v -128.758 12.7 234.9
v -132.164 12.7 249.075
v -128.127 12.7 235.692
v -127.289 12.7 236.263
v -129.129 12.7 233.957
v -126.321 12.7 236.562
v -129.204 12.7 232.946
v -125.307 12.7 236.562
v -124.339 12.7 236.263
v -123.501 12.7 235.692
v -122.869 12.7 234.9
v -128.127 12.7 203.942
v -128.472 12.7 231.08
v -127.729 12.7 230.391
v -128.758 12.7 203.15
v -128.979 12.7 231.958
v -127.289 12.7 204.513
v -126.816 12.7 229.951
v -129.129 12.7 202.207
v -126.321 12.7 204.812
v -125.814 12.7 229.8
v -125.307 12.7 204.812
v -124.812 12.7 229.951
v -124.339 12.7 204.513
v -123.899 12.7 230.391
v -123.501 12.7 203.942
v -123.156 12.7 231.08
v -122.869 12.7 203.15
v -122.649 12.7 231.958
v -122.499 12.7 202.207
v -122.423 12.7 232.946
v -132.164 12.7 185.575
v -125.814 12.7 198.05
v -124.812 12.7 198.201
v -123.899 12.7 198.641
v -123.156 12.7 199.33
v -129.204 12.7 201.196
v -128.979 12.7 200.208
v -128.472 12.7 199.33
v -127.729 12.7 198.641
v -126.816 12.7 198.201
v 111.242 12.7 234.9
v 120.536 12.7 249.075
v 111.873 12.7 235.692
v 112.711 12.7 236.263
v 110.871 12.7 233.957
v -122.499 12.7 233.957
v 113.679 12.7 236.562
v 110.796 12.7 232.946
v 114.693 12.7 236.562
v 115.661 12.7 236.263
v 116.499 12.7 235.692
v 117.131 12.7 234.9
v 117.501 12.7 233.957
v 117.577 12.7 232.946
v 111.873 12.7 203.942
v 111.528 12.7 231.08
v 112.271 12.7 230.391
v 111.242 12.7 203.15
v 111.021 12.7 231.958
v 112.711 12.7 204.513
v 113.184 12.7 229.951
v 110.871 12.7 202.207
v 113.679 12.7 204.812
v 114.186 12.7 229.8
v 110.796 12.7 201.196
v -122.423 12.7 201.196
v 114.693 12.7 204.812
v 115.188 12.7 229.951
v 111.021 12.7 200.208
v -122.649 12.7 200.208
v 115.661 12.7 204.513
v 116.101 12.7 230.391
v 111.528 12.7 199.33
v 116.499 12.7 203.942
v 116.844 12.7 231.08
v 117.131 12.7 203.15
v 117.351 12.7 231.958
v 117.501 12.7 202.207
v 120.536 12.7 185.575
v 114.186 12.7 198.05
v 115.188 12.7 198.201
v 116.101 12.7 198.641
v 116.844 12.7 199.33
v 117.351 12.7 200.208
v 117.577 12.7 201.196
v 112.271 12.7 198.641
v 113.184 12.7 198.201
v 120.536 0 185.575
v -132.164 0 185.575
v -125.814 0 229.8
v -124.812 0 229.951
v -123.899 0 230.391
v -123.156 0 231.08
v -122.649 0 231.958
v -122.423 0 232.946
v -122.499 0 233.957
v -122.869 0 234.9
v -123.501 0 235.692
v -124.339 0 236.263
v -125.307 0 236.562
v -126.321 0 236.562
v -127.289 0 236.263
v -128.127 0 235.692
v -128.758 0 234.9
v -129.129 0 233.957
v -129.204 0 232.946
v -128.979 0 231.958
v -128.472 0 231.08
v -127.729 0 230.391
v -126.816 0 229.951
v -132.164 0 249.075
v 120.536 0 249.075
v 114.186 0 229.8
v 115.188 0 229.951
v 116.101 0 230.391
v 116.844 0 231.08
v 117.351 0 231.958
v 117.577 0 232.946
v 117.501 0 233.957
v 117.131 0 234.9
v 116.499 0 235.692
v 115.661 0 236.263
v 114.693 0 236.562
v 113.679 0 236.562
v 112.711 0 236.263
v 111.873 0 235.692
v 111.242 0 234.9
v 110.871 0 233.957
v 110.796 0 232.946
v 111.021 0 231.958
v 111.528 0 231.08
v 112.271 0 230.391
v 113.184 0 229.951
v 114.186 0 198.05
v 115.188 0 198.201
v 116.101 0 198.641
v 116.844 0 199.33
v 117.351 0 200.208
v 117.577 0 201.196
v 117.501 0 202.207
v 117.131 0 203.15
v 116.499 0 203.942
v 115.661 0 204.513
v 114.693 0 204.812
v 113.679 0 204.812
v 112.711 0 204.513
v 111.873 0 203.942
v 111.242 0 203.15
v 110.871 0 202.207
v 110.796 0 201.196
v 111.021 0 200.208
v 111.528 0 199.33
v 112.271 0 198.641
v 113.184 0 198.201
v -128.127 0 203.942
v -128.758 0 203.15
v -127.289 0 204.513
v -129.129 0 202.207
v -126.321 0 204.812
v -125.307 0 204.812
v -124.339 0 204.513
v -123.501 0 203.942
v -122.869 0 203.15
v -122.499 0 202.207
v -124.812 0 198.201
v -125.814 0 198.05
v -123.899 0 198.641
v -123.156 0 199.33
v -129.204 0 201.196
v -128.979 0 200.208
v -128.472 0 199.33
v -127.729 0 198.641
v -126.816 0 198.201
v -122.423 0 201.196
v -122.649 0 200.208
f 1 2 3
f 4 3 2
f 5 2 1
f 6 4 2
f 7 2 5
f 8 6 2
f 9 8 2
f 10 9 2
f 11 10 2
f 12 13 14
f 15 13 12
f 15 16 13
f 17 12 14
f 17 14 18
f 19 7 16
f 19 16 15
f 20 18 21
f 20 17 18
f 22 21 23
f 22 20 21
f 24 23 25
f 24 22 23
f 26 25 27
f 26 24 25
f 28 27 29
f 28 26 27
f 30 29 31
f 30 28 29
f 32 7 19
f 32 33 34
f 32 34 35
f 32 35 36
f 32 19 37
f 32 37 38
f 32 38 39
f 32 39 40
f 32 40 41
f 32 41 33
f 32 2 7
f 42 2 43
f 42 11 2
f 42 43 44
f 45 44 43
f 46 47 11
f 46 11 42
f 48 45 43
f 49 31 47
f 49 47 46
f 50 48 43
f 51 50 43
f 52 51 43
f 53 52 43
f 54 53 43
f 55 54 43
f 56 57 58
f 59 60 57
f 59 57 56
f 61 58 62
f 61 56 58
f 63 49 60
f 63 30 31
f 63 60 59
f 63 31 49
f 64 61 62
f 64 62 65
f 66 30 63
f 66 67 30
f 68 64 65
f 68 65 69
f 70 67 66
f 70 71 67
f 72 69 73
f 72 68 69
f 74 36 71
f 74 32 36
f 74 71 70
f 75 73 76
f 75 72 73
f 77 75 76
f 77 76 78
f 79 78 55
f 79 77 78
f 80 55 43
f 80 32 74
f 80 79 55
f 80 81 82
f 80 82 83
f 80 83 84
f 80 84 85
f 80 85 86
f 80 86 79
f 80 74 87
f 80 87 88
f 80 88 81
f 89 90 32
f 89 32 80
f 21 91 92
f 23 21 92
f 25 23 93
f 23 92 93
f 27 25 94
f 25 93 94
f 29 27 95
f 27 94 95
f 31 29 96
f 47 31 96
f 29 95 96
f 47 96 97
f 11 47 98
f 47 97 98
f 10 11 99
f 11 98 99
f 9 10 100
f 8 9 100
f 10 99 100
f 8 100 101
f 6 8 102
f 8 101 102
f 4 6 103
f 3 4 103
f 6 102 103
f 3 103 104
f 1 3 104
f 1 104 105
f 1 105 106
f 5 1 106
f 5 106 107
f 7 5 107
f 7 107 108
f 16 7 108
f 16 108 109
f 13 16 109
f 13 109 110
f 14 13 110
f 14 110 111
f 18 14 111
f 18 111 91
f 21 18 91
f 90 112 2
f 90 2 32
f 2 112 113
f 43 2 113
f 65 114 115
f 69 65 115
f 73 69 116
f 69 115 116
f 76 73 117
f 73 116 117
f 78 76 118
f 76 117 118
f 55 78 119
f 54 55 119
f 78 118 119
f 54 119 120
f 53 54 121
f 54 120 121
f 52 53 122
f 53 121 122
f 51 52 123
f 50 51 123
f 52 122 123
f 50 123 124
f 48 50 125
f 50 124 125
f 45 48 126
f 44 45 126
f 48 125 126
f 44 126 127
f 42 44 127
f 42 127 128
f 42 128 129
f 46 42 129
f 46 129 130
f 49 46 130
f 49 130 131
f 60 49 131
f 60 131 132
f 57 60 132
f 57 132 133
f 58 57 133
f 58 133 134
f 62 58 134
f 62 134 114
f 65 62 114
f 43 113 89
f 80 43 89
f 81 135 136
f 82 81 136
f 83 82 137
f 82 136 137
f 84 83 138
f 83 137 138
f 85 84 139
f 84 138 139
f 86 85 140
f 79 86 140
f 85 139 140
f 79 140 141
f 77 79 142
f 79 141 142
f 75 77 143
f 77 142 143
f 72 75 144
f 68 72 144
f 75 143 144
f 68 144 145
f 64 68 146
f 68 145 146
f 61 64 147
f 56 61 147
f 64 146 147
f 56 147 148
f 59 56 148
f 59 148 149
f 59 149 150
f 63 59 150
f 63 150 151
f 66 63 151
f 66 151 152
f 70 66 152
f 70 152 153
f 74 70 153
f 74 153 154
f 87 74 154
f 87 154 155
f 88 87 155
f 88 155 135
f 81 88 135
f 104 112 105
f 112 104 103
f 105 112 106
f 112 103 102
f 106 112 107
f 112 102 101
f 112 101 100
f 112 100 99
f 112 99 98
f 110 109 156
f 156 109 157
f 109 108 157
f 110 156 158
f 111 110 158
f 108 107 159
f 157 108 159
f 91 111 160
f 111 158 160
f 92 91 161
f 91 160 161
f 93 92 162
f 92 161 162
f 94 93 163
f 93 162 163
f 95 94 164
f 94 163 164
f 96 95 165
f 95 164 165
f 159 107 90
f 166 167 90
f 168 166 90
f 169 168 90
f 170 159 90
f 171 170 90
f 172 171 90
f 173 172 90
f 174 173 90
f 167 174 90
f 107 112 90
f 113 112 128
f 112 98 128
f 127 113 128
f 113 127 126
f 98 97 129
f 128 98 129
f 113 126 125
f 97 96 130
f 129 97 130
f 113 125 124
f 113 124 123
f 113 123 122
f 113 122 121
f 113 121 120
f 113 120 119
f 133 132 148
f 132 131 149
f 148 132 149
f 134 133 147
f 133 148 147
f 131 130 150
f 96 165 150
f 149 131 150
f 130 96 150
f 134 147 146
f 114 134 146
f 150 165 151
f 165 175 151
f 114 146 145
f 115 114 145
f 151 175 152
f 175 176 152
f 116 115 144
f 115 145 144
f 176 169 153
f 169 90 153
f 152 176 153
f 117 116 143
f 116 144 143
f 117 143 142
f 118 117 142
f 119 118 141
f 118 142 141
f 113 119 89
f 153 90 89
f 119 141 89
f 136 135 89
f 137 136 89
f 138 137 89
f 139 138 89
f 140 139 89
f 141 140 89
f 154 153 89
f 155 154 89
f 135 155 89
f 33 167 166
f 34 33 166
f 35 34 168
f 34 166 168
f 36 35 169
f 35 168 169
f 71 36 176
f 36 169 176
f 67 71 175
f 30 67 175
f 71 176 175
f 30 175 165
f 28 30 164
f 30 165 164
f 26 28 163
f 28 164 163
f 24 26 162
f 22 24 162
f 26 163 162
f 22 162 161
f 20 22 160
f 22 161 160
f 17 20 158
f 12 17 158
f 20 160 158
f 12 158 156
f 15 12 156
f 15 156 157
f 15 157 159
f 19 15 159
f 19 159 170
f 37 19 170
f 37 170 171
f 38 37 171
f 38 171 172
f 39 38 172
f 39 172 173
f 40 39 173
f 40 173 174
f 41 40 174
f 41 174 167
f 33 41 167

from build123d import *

# Parameters (mm, degrees)
SKETCH2_W                        = 252.7
SKETCH2_H                        = 63.5
BOSS_EXTRUDE2_DEPTH              = 12.7
TAP_DRILL_FOR_M8X1_25_TAP1_D     = 6.8
TAP_DRILL_FOR_M8X1_25_TAP1_DEPTH = 40
TAP_DRILL_FOR_M8X1_25_TAP1_TIP   = 2.042926105


with BuildPart() as part:
    # Sketch2 → Boss-Extrude2 (new body)
    with BuildSketch(Plane(origin=(0, 0, 0), x_dir=(1, 0, 0), z_dir=(0, 1, 0))):
        with Locations((-5.813963312, -217.324932993)):
            Rectangle(SKETCH2_W, SKETCH2_H)
    extrude(amount=BOSS_EXTRUDE2_DEPTH)

    # Tap Drill for M8x1.25 Tap1
    with Locations(Plane(origin=(-125.813963312, 12.7, 201.449932993), x_dir=(0, 0, 1), z_dir=(0, 1, 0))):
        with Locations((0, 0), (31.75, 0), (0, 240), (31.75, 240)):
            Hole(TAP_DRILL_FOR_M8X1_25_TAP1_D / 2, depth=TAP_DRILL_FOR_M8X1_25_TAP1_DEPTH)
            with Locations((0, 0, -(TAP_DRILL_FOR_M8X1_25_TAP1_DEPTH + TAP_DRILL_FOR_M8X1_25_TAP1_TIP / 2))):  # 118° drill point
                Cone(0, TAP_DRILL_FOR_M8X1_25_TAP1_D / 2, TAP_DRILL_FOR_M8X1_25_TAP1_TIP, mode=Mode.SUBTRACT)


solid = part.part
